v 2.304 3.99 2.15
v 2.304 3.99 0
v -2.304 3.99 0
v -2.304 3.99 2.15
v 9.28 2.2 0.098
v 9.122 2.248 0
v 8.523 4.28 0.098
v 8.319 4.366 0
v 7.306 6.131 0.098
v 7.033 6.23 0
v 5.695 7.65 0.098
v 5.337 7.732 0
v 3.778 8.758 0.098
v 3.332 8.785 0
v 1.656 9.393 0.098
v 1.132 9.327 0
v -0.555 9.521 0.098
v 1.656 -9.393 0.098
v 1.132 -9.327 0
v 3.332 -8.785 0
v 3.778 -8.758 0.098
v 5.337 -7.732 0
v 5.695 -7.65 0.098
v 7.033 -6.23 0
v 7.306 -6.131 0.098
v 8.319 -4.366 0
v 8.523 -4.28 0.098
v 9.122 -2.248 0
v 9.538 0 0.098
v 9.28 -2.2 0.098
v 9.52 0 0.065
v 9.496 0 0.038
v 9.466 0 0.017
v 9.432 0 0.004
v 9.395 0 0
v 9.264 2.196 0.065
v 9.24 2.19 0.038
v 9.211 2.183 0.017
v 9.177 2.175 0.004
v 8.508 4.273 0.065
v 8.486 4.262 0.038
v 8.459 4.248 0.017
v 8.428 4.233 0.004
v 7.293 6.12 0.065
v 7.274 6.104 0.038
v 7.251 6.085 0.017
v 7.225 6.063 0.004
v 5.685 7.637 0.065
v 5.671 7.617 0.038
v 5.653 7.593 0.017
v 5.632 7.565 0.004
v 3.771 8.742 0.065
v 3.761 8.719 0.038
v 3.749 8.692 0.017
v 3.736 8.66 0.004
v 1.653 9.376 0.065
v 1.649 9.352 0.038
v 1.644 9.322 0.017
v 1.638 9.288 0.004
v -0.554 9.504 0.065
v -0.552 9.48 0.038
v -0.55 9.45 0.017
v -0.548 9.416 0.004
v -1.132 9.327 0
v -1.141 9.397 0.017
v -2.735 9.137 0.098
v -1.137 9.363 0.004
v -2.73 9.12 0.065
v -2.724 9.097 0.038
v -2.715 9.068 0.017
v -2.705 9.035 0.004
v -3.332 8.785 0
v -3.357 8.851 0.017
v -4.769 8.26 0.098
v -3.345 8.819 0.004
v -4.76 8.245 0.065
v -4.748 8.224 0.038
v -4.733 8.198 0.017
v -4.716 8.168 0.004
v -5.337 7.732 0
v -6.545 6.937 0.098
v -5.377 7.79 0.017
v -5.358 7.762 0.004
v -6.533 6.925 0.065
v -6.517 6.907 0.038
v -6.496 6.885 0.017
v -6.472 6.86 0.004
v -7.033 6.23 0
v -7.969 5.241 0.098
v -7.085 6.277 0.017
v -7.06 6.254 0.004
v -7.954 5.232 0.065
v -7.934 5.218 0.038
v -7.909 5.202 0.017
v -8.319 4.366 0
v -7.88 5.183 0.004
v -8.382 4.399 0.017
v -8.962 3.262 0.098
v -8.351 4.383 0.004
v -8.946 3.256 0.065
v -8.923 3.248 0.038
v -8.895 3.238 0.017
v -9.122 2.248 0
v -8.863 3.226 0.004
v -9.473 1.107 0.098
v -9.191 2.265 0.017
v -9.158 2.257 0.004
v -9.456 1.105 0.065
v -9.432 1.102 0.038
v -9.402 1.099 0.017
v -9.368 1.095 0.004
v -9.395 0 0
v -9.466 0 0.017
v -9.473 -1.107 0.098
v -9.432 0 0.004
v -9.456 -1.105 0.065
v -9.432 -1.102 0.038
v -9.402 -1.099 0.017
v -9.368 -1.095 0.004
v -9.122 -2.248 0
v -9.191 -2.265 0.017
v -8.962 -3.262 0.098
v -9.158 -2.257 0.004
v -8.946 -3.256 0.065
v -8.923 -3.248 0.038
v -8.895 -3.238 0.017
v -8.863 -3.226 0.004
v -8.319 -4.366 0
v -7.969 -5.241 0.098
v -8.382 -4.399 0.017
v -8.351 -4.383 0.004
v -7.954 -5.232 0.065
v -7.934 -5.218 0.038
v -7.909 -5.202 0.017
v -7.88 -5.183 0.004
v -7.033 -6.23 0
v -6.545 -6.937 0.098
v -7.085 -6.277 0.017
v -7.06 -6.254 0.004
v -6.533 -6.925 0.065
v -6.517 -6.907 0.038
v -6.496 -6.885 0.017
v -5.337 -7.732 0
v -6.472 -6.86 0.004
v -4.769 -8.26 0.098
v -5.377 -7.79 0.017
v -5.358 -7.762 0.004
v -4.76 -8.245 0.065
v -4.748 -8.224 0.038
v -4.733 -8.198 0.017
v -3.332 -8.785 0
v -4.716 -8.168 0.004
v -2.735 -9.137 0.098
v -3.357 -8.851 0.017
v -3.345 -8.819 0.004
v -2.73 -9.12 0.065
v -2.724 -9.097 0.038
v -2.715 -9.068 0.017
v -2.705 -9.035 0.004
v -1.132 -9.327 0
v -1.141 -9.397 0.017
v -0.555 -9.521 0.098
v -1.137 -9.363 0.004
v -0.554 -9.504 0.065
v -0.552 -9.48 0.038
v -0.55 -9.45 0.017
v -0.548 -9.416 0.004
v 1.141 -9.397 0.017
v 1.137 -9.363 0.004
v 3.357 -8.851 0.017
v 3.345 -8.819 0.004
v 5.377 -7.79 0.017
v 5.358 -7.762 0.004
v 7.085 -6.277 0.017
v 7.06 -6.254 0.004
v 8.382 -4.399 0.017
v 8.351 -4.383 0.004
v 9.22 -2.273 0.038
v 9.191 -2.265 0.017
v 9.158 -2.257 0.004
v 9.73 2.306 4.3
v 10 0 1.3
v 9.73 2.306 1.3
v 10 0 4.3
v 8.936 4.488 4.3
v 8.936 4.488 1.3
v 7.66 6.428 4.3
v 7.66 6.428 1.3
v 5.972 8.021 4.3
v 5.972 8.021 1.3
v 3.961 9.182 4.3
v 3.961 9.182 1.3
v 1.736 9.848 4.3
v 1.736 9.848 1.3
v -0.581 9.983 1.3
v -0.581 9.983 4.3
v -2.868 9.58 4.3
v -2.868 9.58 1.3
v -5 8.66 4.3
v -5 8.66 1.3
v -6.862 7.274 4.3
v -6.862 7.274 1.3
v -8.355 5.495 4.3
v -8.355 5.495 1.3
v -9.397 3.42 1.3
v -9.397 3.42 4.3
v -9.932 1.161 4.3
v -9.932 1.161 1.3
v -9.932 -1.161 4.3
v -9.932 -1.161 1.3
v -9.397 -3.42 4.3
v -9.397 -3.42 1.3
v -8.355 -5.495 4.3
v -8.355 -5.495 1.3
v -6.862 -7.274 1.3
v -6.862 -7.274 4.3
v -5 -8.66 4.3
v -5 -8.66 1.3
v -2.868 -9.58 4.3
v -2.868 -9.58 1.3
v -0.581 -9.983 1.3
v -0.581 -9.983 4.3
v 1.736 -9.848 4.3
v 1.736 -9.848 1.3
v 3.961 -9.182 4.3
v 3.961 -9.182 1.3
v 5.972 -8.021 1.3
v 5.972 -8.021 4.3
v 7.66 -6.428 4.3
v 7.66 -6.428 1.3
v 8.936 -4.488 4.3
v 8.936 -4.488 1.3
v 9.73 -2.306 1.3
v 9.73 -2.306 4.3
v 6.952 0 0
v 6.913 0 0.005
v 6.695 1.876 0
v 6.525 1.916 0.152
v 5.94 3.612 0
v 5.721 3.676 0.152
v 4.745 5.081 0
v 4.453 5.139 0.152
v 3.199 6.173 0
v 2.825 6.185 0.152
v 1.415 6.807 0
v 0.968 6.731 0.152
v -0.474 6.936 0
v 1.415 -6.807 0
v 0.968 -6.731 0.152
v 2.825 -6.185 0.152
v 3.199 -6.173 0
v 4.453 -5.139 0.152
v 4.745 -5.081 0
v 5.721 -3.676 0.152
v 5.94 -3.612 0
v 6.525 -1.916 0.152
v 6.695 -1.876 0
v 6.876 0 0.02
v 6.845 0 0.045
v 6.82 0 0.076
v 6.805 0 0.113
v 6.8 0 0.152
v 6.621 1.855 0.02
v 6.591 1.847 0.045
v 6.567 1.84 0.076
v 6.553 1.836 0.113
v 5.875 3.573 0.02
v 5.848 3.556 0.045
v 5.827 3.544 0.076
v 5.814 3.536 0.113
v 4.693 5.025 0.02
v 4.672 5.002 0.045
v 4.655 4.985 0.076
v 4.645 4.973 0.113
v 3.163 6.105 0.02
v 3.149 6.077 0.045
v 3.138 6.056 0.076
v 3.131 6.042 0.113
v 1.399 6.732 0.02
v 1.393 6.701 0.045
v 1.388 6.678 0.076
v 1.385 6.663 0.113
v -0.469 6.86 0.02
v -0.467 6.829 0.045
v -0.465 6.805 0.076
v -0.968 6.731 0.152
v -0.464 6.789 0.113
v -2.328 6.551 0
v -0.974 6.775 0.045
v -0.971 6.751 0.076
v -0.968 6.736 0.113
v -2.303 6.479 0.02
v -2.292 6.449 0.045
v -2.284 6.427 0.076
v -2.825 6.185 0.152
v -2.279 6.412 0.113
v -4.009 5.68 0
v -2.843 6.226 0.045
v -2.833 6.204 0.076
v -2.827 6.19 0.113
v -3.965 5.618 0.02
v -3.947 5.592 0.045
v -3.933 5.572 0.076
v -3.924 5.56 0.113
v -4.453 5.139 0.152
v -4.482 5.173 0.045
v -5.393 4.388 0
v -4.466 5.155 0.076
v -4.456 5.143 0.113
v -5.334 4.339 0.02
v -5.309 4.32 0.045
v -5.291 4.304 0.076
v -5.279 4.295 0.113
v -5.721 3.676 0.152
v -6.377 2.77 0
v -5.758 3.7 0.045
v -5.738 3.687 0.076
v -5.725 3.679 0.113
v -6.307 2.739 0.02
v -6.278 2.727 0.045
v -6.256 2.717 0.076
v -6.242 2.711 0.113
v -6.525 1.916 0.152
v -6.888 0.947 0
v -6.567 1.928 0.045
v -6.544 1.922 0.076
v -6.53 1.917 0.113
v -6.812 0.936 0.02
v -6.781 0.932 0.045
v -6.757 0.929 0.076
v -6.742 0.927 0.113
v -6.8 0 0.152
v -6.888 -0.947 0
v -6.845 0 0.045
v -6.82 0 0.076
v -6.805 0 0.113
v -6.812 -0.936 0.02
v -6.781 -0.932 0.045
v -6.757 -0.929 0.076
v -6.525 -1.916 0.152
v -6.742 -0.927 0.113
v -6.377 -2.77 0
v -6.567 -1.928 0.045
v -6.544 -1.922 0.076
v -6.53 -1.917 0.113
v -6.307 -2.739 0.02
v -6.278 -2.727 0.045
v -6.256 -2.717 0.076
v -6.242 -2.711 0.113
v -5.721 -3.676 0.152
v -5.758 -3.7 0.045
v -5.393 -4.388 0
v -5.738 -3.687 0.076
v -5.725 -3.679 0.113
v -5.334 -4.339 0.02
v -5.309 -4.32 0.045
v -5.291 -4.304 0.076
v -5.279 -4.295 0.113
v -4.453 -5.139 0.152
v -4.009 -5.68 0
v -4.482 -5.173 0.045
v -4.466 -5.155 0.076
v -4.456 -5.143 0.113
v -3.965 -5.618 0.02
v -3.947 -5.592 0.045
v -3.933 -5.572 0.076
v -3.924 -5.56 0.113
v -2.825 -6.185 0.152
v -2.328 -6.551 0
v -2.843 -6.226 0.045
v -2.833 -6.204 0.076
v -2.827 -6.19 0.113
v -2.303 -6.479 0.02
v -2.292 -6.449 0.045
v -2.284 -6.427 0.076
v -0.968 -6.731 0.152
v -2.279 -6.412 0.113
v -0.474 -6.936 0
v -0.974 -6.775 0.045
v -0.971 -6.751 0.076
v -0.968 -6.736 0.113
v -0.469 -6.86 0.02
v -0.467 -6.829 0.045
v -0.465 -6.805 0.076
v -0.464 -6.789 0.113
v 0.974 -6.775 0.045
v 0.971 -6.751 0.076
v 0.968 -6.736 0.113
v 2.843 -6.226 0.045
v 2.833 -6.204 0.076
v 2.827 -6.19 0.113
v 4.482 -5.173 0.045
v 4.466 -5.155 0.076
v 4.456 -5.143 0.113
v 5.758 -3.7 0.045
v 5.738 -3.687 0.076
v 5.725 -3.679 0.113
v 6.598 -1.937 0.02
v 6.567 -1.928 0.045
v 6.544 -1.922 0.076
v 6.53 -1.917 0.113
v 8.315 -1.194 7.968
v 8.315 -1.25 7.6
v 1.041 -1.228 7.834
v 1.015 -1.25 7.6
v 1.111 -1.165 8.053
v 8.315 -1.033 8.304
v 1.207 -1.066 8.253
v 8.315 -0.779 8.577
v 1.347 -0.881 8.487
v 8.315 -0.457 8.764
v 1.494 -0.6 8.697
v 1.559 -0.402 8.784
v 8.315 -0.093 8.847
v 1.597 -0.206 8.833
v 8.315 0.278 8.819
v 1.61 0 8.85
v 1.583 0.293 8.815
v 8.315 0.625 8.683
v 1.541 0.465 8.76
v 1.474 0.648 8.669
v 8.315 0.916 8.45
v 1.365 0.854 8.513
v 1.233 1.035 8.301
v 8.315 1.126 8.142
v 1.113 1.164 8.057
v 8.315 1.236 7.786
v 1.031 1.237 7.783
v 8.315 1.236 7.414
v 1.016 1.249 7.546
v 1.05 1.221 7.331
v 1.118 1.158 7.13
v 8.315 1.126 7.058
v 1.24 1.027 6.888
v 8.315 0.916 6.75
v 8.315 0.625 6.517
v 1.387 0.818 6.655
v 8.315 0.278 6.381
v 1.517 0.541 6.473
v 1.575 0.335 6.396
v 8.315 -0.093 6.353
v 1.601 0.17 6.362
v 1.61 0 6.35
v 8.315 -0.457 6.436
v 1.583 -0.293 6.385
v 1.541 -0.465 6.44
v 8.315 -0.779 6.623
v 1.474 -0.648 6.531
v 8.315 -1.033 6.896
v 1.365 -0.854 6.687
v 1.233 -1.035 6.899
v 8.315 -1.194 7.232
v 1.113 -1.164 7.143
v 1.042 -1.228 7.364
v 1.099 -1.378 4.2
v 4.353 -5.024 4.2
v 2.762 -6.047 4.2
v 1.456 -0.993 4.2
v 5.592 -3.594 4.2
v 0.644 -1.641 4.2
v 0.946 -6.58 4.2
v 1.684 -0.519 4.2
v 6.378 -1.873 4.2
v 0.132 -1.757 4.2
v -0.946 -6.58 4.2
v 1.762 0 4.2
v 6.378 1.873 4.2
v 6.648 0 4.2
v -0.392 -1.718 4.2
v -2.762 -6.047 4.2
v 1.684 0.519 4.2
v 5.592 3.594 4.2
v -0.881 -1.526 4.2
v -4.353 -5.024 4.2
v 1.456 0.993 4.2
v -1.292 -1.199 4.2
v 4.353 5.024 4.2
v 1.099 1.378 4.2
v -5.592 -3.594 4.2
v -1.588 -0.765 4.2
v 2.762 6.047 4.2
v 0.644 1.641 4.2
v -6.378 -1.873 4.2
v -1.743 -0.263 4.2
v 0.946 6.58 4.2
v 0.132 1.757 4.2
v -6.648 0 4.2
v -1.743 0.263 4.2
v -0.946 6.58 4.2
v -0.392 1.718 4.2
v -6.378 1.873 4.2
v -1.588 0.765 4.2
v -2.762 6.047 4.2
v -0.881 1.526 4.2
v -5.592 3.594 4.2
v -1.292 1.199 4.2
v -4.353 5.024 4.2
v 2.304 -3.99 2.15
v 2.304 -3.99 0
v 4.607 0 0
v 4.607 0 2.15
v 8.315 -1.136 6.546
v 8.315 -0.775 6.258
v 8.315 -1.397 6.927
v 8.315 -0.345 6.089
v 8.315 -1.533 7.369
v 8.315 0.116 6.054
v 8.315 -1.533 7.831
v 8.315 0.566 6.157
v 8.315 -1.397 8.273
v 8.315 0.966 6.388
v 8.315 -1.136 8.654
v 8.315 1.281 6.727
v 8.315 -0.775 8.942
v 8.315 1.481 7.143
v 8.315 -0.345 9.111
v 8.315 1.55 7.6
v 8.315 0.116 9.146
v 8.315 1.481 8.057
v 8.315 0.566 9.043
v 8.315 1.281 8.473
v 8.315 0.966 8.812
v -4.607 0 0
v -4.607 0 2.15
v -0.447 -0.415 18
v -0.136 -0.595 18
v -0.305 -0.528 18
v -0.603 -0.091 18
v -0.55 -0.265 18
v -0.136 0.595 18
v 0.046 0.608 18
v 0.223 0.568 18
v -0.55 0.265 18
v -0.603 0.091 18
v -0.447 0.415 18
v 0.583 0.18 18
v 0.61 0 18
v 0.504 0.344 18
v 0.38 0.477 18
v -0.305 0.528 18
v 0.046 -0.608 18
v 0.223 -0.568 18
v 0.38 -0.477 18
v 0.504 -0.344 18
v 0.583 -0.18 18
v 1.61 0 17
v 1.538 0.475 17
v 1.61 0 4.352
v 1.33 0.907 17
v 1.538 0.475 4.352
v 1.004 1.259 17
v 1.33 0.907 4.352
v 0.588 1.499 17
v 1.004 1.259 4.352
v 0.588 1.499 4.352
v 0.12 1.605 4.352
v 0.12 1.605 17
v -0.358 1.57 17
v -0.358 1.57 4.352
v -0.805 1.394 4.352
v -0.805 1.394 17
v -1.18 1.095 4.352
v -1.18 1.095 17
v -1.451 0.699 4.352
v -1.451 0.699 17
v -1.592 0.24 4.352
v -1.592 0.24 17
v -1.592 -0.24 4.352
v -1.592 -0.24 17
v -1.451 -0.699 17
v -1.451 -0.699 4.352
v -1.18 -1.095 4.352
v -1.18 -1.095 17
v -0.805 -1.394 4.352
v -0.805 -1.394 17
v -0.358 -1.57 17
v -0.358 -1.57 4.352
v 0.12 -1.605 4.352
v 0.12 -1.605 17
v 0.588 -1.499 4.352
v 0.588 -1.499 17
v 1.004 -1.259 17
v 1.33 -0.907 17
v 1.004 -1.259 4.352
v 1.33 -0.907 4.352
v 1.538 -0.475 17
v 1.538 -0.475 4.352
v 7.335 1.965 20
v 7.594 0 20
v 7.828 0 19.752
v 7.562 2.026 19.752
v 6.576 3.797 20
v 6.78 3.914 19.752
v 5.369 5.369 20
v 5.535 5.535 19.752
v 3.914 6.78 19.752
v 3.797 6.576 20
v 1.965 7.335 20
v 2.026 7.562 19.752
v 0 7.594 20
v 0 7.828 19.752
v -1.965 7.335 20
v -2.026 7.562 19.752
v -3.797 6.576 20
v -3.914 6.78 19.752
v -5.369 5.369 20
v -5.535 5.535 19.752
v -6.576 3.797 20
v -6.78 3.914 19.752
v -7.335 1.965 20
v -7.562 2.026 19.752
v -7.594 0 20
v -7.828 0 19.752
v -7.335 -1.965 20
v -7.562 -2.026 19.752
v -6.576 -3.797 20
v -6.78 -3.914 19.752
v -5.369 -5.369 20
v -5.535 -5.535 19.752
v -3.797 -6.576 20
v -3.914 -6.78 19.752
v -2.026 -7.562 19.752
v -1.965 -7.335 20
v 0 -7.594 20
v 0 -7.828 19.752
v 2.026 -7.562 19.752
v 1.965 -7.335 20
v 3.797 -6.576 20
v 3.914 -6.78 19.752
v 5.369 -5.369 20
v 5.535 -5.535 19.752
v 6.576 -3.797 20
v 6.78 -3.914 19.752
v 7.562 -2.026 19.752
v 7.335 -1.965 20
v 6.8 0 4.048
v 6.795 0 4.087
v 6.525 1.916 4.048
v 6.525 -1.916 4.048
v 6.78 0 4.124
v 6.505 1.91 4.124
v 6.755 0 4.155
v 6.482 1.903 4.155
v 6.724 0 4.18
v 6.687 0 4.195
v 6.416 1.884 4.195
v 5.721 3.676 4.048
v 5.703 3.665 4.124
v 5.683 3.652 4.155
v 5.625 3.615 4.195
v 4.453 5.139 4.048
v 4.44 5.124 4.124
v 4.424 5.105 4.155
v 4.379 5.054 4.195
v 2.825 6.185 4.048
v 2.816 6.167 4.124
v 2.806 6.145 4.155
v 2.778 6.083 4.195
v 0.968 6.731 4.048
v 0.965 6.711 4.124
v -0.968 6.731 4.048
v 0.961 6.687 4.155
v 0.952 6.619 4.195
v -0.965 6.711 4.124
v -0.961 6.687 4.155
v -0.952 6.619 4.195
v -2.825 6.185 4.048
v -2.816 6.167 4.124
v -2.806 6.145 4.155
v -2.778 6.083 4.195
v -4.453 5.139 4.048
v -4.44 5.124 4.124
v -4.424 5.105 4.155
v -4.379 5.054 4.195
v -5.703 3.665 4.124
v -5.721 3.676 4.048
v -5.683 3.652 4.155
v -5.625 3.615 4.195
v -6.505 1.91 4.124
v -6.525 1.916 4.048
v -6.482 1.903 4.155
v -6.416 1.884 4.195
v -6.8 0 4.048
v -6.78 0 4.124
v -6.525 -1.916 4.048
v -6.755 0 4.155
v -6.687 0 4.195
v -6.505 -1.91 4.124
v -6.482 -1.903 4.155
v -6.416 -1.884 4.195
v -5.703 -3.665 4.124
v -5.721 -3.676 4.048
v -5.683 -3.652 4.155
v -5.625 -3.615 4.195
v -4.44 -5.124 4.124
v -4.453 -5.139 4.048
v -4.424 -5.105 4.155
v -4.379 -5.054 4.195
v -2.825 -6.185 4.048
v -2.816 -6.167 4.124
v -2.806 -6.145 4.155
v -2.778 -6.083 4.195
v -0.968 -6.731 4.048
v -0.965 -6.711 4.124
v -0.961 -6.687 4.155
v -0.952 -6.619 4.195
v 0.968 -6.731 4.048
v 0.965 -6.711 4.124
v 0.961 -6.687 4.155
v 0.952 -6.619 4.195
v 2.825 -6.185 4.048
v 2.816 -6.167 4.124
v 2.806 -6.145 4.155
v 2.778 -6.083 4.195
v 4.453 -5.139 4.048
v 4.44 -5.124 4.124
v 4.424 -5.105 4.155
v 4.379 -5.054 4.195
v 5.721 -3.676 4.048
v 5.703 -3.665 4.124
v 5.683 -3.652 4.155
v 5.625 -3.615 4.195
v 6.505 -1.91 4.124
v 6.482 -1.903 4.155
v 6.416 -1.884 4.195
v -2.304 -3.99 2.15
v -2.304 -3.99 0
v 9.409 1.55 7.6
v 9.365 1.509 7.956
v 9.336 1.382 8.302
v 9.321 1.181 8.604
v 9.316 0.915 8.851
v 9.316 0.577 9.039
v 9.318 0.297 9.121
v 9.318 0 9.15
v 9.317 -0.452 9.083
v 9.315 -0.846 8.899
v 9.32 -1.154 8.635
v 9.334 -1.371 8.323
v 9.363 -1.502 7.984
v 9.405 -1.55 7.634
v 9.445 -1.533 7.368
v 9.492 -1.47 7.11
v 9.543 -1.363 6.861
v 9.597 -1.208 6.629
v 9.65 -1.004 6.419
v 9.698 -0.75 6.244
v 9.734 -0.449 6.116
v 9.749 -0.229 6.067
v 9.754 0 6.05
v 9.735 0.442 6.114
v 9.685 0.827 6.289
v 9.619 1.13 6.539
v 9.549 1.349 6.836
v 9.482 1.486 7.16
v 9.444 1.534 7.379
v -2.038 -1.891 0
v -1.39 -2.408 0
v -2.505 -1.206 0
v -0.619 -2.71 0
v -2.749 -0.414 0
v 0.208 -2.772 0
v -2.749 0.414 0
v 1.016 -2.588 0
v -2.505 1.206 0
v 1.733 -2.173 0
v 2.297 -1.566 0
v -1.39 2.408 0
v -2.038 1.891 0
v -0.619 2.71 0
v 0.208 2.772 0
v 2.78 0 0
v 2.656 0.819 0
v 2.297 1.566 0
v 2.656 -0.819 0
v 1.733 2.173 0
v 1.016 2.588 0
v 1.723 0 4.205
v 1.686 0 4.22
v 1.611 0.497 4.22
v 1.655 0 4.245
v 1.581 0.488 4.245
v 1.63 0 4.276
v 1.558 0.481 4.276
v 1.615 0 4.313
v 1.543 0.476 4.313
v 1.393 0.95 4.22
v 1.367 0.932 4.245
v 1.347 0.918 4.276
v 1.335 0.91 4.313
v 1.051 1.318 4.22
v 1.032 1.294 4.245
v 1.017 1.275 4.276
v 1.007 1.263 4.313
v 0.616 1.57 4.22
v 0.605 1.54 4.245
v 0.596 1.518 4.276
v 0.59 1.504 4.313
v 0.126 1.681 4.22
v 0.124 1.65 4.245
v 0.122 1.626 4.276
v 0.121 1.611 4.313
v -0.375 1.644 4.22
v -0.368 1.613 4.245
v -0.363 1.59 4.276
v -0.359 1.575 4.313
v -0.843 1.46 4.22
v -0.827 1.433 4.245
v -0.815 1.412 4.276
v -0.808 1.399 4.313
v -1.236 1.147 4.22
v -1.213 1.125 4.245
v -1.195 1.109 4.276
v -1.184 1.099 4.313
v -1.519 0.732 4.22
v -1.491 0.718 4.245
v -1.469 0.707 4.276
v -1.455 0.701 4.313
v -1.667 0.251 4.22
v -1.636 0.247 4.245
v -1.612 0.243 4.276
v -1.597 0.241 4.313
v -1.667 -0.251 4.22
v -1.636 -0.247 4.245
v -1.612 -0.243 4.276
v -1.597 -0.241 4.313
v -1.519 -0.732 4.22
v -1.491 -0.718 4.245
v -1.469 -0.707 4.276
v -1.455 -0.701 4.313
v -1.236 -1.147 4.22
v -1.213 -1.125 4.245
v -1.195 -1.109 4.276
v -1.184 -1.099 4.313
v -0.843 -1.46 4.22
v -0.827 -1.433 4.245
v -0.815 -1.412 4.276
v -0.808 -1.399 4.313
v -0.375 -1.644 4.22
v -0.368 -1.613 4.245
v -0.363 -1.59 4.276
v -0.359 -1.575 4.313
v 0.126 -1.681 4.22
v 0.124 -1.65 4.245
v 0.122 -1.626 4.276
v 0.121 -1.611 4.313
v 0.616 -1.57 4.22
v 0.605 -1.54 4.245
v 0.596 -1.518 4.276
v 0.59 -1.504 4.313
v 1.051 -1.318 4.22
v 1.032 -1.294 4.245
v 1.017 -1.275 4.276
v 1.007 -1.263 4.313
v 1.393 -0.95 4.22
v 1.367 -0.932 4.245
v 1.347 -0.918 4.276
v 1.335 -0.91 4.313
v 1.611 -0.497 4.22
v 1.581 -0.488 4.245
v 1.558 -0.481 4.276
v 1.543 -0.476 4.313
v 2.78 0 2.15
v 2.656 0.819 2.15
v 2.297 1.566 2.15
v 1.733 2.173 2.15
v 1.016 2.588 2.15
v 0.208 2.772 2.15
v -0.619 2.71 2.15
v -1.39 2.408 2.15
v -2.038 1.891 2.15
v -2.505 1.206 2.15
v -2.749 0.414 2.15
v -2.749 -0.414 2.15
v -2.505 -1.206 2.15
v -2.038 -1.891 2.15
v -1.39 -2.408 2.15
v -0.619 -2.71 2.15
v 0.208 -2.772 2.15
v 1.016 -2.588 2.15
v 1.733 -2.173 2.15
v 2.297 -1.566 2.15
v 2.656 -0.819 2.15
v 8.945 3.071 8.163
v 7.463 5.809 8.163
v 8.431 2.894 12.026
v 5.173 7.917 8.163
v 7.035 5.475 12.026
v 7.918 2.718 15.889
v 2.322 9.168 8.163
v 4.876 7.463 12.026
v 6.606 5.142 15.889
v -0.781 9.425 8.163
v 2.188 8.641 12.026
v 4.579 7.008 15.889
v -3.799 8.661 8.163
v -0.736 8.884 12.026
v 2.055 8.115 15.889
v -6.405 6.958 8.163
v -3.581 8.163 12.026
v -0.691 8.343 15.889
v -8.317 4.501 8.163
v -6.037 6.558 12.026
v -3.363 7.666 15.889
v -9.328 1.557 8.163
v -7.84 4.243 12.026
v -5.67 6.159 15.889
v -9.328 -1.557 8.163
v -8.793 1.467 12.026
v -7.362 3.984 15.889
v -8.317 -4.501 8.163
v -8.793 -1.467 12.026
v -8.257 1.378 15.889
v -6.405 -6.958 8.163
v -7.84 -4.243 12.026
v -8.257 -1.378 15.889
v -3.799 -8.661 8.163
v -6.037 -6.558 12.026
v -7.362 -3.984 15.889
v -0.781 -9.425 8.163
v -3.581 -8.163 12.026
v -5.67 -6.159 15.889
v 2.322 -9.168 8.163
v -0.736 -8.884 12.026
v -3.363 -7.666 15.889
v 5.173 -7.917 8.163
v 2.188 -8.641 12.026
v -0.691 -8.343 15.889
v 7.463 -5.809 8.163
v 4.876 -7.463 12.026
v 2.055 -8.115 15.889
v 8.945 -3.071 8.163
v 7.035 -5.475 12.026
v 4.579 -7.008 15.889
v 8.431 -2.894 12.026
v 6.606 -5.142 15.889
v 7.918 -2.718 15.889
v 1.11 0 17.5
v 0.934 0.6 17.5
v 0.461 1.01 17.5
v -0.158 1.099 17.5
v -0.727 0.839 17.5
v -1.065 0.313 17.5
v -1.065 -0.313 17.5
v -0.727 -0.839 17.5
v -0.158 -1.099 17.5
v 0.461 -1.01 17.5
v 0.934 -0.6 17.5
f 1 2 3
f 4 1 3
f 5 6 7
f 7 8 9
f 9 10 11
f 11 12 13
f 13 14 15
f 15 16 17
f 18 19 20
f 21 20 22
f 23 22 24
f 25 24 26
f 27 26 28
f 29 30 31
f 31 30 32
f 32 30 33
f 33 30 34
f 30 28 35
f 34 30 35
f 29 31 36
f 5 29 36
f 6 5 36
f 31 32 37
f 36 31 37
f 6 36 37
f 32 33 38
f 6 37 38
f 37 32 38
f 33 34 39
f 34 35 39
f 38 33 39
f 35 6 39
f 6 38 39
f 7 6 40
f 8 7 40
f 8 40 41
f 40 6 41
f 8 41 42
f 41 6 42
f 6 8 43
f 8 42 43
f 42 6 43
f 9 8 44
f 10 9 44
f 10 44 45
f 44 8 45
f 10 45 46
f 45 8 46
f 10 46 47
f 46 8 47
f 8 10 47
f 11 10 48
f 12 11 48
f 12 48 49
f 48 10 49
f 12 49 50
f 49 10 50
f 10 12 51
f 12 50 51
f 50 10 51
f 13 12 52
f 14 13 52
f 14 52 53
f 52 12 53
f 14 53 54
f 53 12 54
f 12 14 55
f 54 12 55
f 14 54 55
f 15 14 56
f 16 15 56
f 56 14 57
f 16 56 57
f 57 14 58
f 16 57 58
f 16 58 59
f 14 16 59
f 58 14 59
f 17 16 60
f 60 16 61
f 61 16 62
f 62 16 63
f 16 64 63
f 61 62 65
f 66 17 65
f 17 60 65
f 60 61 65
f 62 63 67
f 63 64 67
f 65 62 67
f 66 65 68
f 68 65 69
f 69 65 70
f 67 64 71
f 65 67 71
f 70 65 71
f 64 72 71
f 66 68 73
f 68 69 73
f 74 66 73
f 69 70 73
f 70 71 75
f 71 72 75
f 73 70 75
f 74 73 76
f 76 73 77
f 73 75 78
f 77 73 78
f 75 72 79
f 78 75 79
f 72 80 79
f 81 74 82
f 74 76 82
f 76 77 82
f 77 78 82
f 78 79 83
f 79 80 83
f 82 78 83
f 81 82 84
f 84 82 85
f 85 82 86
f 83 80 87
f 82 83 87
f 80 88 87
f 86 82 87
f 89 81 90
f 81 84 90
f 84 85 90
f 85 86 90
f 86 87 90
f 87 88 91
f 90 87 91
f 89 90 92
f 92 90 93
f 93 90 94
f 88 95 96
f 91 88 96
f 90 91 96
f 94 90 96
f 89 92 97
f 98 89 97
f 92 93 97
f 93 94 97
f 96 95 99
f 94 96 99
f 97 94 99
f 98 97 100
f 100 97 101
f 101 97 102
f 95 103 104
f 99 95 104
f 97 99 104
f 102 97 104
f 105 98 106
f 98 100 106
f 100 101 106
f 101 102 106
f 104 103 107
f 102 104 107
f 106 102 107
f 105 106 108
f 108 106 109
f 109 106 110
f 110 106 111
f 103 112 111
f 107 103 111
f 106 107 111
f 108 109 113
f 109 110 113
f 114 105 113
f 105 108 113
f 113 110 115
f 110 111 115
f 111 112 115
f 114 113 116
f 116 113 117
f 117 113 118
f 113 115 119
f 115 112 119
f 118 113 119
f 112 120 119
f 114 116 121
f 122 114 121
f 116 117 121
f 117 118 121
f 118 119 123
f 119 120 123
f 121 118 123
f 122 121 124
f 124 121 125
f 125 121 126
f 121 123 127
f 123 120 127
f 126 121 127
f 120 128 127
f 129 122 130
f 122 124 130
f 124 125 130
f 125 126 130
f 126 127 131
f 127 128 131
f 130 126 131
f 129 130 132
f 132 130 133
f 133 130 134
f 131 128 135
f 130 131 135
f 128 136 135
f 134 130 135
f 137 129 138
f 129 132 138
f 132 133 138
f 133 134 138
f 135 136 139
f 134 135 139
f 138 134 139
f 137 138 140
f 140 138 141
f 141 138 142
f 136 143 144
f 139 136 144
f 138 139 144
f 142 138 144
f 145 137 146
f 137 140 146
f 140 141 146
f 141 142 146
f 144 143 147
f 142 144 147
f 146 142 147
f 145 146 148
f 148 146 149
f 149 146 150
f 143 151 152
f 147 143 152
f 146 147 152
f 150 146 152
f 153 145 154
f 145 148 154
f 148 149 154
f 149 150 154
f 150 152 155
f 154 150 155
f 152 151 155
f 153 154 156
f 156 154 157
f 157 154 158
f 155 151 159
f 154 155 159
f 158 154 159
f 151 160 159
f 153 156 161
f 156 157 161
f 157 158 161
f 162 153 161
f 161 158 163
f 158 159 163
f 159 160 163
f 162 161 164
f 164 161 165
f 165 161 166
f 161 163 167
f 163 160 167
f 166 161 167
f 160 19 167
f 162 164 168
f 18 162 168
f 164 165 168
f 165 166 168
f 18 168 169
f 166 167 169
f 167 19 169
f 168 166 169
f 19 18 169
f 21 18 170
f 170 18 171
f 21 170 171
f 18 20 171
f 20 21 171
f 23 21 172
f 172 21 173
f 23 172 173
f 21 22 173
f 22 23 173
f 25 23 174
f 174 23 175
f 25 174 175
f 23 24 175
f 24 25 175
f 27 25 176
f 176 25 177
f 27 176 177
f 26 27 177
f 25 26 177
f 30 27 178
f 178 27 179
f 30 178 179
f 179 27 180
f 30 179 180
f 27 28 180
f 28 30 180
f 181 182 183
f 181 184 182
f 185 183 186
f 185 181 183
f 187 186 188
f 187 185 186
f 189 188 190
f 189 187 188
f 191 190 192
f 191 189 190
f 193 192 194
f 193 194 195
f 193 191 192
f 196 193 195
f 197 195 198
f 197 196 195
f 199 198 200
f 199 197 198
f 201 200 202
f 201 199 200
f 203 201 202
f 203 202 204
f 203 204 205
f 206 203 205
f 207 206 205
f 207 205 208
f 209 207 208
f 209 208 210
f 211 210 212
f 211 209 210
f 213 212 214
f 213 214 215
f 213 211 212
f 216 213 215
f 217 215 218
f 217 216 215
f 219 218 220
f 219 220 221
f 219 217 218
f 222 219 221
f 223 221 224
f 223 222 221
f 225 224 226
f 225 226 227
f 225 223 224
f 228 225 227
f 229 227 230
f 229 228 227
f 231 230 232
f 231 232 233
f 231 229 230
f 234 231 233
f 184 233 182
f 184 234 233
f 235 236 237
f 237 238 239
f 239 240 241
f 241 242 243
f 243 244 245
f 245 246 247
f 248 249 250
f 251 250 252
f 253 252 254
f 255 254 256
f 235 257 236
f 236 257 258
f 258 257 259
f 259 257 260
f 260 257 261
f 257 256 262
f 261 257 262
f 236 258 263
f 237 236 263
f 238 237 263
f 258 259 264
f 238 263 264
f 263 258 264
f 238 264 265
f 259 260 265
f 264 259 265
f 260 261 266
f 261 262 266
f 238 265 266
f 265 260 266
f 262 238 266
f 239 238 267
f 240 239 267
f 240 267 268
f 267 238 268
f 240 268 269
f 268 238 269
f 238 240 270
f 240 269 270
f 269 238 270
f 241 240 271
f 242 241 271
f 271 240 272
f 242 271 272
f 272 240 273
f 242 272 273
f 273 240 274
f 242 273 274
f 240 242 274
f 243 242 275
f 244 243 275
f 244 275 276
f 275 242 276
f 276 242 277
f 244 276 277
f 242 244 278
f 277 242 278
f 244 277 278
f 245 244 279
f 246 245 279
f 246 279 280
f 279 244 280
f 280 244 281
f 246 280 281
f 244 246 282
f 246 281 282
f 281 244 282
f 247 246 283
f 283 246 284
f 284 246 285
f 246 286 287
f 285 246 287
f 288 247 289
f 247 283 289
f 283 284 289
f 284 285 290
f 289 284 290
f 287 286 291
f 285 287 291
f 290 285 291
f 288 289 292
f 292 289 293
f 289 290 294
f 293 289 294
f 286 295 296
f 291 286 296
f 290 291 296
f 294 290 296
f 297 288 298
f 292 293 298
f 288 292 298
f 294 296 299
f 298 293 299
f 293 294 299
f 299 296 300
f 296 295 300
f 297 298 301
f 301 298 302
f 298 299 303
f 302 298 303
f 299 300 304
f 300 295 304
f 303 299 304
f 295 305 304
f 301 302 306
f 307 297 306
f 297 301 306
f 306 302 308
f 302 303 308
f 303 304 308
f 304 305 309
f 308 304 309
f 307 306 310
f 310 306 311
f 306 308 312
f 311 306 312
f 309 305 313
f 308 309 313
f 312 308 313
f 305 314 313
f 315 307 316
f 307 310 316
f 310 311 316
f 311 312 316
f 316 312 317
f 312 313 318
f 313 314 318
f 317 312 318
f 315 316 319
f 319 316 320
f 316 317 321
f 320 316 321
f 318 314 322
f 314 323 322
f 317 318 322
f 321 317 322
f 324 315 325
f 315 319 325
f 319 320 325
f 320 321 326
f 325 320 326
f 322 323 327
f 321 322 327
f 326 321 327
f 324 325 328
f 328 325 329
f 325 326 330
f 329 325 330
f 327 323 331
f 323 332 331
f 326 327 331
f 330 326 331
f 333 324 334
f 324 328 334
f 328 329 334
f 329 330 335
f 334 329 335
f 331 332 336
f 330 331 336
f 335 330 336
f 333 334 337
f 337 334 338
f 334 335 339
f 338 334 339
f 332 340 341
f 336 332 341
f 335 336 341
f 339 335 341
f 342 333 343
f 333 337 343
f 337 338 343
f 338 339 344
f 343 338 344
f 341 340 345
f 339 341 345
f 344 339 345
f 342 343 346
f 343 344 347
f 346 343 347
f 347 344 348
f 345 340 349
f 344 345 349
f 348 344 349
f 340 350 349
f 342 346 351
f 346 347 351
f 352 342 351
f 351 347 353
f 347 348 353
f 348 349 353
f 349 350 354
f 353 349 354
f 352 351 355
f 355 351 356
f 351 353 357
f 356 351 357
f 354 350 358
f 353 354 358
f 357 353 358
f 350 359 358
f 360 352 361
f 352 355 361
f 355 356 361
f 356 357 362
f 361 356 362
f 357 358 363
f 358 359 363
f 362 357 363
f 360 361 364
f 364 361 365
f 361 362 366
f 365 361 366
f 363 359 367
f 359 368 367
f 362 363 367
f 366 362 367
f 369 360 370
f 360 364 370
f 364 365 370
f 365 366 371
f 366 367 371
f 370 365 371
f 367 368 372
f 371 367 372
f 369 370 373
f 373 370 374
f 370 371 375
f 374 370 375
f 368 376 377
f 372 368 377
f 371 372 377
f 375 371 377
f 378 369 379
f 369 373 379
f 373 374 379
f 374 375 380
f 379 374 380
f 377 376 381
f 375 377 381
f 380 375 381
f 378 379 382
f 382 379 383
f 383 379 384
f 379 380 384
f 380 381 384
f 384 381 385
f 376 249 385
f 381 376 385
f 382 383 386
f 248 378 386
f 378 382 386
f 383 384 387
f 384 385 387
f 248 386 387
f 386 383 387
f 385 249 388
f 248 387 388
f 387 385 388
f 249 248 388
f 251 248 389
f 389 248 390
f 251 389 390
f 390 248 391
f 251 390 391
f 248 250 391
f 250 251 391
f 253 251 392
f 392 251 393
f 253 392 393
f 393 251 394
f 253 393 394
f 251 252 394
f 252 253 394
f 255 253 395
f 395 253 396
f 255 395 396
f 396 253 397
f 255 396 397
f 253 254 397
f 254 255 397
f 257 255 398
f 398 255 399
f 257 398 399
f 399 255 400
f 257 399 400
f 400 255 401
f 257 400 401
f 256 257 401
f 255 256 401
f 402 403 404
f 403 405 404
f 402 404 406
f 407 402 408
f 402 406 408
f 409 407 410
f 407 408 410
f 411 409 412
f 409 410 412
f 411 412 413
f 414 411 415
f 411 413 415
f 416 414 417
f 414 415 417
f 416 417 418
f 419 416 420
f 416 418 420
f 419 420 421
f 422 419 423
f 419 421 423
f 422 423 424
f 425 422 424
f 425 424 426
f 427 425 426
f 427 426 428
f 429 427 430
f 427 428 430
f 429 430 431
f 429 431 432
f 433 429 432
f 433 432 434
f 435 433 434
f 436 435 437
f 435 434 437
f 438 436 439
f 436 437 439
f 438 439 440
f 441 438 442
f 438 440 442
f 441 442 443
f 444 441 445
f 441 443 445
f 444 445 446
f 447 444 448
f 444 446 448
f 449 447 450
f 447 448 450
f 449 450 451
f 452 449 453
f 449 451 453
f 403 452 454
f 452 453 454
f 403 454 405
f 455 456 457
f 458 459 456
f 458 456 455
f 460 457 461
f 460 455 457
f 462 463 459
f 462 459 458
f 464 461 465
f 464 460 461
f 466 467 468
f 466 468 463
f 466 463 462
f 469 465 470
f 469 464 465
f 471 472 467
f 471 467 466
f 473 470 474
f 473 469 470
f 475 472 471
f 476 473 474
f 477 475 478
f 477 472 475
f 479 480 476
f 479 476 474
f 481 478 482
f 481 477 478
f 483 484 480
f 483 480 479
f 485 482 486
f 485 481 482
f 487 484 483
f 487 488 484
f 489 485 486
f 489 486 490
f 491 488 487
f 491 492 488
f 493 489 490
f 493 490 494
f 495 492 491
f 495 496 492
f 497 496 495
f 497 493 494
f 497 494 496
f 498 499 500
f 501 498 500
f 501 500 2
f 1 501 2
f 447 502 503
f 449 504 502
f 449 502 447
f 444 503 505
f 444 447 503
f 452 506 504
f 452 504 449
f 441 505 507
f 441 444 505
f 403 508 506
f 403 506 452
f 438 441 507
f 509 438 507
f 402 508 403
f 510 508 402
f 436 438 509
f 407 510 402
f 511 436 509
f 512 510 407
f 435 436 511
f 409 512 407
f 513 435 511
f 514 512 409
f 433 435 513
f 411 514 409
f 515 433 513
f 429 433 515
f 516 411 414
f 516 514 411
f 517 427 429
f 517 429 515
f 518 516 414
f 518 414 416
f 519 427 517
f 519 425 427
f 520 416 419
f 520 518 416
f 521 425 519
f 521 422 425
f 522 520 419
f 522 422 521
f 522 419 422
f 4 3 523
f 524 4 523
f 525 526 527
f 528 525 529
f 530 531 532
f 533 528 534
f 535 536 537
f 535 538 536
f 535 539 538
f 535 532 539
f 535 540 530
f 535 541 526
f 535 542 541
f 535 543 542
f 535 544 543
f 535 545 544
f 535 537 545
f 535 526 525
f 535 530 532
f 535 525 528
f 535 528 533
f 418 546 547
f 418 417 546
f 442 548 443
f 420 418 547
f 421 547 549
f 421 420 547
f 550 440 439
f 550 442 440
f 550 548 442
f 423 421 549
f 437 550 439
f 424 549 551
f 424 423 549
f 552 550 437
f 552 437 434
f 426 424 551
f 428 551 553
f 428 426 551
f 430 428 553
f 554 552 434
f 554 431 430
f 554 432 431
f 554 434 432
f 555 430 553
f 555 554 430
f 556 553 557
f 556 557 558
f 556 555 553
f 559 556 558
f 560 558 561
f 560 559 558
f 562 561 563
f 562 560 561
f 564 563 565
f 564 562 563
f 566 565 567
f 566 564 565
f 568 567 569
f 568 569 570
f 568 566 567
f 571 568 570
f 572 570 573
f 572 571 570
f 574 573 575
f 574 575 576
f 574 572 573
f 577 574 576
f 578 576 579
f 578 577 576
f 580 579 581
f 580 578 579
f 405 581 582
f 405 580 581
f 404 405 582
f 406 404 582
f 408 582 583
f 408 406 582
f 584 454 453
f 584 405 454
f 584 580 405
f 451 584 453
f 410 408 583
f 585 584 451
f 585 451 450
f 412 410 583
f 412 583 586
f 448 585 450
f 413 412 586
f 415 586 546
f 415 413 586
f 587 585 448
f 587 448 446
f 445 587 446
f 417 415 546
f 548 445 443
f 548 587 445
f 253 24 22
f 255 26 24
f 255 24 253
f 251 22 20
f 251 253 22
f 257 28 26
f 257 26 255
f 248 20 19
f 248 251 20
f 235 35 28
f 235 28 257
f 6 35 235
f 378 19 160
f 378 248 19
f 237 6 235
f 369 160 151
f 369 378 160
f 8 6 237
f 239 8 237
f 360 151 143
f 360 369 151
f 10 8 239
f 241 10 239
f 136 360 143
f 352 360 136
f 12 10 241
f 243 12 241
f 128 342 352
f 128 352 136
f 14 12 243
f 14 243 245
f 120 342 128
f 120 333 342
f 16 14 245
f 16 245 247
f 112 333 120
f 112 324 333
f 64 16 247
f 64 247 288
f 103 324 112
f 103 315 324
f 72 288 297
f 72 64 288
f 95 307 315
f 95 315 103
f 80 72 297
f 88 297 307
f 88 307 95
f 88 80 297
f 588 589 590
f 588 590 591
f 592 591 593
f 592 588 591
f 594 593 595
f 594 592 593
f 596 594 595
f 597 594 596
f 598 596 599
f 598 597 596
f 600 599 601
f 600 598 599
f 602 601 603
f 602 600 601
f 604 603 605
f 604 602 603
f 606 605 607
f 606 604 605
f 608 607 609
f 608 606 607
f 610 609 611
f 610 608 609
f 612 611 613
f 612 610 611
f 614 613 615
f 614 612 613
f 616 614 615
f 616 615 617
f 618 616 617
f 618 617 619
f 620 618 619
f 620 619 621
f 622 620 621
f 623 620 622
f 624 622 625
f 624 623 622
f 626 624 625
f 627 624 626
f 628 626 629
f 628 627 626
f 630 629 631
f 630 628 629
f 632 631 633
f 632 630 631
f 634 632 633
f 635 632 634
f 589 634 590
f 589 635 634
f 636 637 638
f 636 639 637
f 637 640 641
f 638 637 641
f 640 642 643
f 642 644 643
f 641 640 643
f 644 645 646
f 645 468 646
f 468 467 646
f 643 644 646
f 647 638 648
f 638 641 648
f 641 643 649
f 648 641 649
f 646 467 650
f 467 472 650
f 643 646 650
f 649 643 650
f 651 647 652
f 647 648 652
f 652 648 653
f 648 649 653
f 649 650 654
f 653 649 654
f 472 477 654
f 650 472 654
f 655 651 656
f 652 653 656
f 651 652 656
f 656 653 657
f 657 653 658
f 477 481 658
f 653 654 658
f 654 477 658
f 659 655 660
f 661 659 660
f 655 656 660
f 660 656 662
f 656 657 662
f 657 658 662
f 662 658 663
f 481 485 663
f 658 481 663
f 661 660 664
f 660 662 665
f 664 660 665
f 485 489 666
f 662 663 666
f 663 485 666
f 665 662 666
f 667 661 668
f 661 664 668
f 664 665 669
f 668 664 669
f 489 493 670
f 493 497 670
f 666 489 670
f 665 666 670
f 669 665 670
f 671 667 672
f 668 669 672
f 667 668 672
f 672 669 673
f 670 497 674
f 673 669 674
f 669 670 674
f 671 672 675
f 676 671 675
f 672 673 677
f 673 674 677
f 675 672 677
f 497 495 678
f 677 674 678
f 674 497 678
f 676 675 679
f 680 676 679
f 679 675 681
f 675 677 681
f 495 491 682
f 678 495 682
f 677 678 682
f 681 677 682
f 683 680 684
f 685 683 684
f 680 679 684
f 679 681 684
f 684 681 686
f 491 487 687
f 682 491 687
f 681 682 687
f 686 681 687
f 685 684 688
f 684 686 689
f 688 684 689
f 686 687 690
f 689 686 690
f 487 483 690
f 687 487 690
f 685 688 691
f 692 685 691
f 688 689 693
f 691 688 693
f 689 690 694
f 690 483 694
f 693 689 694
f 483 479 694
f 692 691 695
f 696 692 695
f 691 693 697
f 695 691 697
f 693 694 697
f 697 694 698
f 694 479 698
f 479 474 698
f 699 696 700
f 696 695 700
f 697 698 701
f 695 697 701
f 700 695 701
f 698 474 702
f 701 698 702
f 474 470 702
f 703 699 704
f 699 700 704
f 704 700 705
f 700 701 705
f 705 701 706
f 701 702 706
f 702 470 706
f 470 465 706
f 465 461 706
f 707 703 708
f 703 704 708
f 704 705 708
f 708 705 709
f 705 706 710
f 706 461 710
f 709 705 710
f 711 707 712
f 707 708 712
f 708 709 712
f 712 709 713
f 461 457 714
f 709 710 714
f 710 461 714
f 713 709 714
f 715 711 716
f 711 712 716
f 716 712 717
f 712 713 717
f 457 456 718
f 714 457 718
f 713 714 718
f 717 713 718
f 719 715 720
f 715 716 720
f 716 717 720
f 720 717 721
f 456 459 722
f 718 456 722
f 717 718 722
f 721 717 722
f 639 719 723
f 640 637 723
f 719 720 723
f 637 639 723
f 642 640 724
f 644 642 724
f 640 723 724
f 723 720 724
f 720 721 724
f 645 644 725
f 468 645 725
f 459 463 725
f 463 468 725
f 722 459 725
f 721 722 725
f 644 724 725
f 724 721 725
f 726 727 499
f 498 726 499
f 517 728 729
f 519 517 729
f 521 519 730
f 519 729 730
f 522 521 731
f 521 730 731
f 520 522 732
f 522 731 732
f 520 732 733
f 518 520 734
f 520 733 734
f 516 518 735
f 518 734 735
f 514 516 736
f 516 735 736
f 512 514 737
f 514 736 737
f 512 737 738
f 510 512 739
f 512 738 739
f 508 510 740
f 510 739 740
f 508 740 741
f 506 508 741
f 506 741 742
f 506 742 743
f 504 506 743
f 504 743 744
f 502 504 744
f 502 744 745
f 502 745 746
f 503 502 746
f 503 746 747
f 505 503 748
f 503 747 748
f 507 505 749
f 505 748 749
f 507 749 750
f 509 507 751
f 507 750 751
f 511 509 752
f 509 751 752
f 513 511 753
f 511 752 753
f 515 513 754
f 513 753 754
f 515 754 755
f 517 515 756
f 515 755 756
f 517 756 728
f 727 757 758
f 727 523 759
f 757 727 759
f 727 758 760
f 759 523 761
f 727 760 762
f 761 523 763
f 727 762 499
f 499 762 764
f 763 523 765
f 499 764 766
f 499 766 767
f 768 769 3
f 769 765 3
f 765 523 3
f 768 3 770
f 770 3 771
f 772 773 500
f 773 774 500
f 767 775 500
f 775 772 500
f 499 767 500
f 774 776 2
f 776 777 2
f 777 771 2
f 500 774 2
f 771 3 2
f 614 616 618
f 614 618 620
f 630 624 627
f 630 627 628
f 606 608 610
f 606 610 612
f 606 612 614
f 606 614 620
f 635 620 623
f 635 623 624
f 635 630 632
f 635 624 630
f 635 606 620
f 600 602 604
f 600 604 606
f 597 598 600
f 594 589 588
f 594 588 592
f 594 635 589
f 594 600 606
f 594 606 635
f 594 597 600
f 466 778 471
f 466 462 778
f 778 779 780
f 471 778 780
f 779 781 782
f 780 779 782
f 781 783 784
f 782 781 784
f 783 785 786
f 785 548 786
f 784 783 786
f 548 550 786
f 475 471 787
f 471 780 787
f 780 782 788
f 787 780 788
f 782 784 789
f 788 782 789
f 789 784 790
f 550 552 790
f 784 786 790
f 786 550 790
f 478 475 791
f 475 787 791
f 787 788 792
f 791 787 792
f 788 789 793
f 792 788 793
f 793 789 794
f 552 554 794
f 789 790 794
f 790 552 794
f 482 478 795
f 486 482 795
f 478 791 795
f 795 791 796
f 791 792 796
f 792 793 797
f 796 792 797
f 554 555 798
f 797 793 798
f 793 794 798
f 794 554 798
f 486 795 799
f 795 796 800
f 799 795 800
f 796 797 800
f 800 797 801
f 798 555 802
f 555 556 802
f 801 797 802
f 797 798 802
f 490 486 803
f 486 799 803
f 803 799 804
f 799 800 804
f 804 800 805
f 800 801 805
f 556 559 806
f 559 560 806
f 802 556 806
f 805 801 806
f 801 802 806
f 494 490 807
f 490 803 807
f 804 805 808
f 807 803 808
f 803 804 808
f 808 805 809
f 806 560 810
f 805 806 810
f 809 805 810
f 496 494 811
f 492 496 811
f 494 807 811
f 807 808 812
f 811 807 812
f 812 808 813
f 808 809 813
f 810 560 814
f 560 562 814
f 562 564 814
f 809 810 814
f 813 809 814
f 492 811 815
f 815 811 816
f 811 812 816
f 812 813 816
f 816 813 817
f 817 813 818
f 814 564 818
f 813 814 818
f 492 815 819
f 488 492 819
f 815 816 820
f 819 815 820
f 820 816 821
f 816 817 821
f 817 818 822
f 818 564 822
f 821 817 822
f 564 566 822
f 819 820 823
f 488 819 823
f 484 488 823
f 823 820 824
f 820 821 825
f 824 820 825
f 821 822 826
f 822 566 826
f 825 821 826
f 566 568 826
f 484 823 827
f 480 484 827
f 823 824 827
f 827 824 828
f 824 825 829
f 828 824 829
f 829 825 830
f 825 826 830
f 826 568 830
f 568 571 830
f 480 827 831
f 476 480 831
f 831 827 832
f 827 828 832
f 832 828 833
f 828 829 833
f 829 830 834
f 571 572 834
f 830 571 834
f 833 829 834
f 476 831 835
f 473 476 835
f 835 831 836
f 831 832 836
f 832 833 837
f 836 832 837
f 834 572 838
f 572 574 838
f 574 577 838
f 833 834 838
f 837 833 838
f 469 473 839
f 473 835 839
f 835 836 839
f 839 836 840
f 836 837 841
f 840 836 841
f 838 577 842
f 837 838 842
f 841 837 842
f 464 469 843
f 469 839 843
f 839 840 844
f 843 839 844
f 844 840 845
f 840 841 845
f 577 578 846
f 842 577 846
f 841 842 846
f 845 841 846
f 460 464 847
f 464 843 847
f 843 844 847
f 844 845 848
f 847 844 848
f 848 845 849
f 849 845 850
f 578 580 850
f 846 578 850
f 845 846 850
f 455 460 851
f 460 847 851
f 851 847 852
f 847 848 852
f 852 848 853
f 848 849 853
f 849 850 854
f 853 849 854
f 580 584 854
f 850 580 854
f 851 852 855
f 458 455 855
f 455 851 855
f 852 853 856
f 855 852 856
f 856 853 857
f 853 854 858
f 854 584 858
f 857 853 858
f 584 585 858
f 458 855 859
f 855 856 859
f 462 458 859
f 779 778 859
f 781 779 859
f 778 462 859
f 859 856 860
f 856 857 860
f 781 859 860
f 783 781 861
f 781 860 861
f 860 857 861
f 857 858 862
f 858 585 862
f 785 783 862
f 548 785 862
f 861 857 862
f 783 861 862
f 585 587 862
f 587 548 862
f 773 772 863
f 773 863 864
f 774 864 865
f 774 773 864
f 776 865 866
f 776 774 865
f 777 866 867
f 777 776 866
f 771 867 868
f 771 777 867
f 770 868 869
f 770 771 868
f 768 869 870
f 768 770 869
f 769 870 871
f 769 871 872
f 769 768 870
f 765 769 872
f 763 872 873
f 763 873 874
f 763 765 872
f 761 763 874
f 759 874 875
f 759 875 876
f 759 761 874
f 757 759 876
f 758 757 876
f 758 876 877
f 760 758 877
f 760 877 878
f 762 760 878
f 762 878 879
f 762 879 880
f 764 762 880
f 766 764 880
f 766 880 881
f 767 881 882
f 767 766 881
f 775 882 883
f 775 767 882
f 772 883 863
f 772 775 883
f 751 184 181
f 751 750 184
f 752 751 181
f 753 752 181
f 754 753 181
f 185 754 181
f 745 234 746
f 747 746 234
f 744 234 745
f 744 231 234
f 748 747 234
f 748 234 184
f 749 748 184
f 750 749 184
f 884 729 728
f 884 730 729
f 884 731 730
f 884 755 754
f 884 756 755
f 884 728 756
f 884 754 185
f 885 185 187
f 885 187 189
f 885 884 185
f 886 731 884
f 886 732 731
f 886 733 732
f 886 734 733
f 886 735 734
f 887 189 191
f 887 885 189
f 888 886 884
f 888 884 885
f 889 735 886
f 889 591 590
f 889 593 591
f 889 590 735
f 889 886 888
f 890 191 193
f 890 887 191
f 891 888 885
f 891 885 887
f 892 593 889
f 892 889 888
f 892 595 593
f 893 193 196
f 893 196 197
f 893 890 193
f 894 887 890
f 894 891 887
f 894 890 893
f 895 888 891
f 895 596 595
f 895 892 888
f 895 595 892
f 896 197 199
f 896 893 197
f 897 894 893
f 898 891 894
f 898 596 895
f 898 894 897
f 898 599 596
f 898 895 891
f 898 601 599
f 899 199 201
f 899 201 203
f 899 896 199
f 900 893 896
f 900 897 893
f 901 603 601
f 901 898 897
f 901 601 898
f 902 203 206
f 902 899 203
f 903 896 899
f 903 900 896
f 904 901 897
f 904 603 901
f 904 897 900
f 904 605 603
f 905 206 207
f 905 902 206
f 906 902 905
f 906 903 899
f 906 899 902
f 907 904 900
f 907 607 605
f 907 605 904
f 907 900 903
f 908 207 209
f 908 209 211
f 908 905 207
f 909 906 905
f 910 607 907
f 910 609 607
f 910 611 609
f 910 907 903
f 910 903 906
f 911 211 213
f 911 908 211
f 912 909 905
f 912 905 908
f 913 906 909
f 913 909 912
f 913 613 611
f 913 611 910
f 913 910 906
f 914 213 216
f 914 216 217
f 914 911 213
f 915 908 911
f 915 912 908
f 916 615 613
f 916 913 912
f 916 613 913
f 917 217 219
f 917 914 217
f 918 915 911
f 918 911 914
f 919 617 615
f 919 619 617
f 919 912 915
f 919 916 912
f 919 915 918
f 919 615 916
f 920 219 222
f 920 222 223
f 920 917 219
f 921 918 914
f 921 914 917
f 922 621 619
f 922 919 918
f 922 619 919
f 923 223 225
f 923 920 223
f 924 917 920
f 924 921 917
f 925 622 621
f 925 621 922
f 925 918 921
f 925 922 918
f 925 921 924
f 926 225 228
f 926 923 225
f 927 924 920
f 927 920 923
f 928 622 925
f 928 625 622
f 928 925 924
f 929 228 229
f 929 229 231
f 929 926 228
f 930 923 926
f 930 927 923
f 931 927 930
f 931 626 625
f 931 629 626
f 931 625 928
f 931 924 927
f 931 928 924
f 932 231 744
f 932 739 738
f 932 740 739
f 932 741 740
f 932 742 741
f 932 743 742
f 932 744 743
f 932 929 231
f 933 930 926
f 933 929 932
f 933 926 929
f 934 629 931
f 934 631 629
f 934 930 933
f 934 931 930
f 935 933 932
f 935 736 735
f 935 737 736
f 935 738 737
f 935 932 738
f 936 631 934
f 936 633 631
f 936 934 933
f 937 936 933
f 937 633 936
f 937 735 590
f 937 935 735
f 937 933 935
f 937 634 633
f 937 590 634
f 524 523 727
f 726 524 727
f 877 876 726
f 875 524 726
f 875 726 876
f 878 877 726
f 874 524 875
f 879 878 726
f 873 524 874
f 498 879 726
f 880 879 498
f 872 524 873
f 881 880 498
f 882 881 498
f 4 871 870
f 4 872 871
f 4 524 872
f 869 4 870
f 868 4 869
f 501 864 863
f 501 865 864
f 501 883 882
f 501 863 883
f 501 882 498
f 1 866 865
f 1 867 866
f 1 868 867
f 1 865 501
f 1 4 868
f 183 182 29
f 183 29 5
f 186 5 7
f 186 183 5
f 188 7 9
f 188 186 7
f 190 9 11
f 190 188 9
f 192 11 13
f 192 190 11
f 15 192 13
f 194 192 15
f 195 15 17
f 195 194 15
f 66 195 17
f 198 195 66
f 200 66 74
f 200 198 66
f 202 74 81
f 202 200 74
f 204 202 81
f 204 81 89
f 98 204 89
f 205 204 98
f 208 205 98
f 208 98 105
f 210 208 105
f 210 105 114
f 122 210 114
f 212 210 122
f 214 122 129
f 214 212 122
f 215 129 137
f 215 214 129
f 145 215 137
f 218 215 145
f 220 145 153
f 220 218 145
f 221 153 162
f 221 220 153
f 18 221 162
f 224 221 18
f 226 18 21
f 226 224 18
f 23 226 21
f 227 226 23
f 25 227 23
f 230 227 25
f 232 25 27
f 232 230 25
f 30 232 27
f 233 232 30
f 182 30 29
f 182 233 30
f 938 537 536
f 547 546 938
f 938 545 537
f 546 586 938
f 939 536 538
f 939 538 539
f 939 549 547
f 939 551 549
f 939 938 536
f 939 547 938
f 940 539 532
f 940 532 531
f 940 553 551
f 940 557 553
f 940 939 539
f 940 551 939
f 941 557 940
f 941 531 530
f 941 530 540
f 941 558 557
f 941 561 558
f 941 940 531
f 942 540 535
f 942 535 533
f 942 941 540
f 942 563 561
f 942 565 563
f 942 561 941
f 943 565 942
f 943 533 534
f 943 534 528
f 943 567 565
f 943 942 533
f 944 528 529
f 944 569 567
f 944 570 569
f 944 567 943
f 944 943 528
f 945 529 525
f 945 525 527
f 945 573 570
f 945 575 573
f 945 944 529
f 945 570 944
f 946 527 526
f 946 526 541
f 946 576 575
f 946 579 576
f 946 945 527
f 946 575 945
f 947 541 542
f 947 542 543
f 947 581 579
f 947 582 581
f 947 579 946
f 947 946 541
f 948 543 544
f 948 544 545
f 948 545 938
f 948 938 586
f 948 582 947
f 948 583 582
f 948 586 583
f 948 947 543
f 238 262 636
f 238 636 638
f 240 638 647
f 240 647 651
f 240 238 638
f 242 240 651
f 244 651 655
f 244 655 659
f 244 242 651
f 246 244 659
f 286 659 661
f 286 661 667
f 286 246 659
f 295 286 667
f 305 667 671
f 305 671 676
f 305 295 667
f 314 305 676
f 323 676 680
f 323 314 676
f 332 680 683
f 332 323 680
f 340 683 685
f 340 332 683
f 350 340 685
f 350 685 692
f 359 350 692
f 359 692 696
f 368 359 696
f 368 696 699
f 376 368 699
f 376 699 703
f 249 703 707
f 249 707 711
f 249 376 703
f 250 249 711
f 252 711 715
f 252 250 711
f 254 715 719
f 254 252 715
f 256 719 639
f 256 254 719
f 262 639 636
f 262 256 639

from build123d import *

# Parameters (mm, degrees)
F3_SIZE        = 1
F4_SIZE2       = 0.2
F4_SIZE        = 0.25
F5_R           = 0.1524
F8_D           = 2.5
F8_DEPTH       = 10
F8_START       = 0.6846642
F8_CBORE_D     = 3.1
F8_CBORE_DEPTH = 1
F8_TIP         = 0.7510757738
F9_R           = 2.78
F10_DEPTH      = 2.15


with BuildPart() as f2:
    # F1 (on Front) → F2 (revolve)
    with BuildSketch(Plane.XZ):
        Polygon((6.8, 4.2), (6.8, 0), (9.5, 0), (10, 1.3), (10, 4.3), (7.7935088952, 20), (0, 20), (0, 18), (1.61, 18), (1.61, 4.2), align=None)
    revolve(axis=Axis((0, 0, 12.1), (0, 0, 1)))

    # F3
    f3_edges = [f2.edges().sort_by_distance(p)[0] for p in [
        (-1.61, 0, 18),
    ]]
    chamfer(f3_edges, length=F3_SIZE)

    # F4
    f4_edges = [f2.edges().sort_by_distance(p)[0] for p in [
        (-7.793509, 0, 20),
    ]]
    chamfer(f4_edges, length=F4_SIZE, length2=F4_SIZE2)

    # F5
    f5_edges = [f2.edges().sort_by_distance(p)[0] for p in [
        (-6.8, 0, 0),
        (-9.5, 0, 0),
        (-6.8, 0, 4.2),
        (-1.61, 0, 4.2),
    ]]
    fillet(f5_edges, radius=F5_R)

    # F8
    # its depths count from where the whole tool has entered the part; down to there all is cleared
    with Locations(Plane.YZ.offset(10).offset(-F8_START)):
        with Locations((0, 7.6)):
            CounterBoreHole(F8_D / 2, F8_CBORE_D / 2, F8_CBORE_DEPTH, depth=F8_DEPTH)
            with Locations((0, 0, -(F8_DEPTH + F8_TIP / 2))):  # 118° drill point
                Cone(0, F8_D / 2, F8_TIP, mode=Mode.SUBTRACT)


with BuildPart() as f10:
    # F9 (on Top) → F10 (new body)
    with BuildSketch(Plane.XY):
        Polygon((-2.3036275741, -3.99), (2.3036275741, -3.99), (4.6072551481, 0), (2.3036275741, 3.99), (-2.3036275741, 3.99), (-4.6072551481, 0), align=None)
        Circle(F9_R, mode=Mode.SUBTRACT)
    extrude(amount=F10_DEPTH)


solid = Compound([f2.part, f10.part])
